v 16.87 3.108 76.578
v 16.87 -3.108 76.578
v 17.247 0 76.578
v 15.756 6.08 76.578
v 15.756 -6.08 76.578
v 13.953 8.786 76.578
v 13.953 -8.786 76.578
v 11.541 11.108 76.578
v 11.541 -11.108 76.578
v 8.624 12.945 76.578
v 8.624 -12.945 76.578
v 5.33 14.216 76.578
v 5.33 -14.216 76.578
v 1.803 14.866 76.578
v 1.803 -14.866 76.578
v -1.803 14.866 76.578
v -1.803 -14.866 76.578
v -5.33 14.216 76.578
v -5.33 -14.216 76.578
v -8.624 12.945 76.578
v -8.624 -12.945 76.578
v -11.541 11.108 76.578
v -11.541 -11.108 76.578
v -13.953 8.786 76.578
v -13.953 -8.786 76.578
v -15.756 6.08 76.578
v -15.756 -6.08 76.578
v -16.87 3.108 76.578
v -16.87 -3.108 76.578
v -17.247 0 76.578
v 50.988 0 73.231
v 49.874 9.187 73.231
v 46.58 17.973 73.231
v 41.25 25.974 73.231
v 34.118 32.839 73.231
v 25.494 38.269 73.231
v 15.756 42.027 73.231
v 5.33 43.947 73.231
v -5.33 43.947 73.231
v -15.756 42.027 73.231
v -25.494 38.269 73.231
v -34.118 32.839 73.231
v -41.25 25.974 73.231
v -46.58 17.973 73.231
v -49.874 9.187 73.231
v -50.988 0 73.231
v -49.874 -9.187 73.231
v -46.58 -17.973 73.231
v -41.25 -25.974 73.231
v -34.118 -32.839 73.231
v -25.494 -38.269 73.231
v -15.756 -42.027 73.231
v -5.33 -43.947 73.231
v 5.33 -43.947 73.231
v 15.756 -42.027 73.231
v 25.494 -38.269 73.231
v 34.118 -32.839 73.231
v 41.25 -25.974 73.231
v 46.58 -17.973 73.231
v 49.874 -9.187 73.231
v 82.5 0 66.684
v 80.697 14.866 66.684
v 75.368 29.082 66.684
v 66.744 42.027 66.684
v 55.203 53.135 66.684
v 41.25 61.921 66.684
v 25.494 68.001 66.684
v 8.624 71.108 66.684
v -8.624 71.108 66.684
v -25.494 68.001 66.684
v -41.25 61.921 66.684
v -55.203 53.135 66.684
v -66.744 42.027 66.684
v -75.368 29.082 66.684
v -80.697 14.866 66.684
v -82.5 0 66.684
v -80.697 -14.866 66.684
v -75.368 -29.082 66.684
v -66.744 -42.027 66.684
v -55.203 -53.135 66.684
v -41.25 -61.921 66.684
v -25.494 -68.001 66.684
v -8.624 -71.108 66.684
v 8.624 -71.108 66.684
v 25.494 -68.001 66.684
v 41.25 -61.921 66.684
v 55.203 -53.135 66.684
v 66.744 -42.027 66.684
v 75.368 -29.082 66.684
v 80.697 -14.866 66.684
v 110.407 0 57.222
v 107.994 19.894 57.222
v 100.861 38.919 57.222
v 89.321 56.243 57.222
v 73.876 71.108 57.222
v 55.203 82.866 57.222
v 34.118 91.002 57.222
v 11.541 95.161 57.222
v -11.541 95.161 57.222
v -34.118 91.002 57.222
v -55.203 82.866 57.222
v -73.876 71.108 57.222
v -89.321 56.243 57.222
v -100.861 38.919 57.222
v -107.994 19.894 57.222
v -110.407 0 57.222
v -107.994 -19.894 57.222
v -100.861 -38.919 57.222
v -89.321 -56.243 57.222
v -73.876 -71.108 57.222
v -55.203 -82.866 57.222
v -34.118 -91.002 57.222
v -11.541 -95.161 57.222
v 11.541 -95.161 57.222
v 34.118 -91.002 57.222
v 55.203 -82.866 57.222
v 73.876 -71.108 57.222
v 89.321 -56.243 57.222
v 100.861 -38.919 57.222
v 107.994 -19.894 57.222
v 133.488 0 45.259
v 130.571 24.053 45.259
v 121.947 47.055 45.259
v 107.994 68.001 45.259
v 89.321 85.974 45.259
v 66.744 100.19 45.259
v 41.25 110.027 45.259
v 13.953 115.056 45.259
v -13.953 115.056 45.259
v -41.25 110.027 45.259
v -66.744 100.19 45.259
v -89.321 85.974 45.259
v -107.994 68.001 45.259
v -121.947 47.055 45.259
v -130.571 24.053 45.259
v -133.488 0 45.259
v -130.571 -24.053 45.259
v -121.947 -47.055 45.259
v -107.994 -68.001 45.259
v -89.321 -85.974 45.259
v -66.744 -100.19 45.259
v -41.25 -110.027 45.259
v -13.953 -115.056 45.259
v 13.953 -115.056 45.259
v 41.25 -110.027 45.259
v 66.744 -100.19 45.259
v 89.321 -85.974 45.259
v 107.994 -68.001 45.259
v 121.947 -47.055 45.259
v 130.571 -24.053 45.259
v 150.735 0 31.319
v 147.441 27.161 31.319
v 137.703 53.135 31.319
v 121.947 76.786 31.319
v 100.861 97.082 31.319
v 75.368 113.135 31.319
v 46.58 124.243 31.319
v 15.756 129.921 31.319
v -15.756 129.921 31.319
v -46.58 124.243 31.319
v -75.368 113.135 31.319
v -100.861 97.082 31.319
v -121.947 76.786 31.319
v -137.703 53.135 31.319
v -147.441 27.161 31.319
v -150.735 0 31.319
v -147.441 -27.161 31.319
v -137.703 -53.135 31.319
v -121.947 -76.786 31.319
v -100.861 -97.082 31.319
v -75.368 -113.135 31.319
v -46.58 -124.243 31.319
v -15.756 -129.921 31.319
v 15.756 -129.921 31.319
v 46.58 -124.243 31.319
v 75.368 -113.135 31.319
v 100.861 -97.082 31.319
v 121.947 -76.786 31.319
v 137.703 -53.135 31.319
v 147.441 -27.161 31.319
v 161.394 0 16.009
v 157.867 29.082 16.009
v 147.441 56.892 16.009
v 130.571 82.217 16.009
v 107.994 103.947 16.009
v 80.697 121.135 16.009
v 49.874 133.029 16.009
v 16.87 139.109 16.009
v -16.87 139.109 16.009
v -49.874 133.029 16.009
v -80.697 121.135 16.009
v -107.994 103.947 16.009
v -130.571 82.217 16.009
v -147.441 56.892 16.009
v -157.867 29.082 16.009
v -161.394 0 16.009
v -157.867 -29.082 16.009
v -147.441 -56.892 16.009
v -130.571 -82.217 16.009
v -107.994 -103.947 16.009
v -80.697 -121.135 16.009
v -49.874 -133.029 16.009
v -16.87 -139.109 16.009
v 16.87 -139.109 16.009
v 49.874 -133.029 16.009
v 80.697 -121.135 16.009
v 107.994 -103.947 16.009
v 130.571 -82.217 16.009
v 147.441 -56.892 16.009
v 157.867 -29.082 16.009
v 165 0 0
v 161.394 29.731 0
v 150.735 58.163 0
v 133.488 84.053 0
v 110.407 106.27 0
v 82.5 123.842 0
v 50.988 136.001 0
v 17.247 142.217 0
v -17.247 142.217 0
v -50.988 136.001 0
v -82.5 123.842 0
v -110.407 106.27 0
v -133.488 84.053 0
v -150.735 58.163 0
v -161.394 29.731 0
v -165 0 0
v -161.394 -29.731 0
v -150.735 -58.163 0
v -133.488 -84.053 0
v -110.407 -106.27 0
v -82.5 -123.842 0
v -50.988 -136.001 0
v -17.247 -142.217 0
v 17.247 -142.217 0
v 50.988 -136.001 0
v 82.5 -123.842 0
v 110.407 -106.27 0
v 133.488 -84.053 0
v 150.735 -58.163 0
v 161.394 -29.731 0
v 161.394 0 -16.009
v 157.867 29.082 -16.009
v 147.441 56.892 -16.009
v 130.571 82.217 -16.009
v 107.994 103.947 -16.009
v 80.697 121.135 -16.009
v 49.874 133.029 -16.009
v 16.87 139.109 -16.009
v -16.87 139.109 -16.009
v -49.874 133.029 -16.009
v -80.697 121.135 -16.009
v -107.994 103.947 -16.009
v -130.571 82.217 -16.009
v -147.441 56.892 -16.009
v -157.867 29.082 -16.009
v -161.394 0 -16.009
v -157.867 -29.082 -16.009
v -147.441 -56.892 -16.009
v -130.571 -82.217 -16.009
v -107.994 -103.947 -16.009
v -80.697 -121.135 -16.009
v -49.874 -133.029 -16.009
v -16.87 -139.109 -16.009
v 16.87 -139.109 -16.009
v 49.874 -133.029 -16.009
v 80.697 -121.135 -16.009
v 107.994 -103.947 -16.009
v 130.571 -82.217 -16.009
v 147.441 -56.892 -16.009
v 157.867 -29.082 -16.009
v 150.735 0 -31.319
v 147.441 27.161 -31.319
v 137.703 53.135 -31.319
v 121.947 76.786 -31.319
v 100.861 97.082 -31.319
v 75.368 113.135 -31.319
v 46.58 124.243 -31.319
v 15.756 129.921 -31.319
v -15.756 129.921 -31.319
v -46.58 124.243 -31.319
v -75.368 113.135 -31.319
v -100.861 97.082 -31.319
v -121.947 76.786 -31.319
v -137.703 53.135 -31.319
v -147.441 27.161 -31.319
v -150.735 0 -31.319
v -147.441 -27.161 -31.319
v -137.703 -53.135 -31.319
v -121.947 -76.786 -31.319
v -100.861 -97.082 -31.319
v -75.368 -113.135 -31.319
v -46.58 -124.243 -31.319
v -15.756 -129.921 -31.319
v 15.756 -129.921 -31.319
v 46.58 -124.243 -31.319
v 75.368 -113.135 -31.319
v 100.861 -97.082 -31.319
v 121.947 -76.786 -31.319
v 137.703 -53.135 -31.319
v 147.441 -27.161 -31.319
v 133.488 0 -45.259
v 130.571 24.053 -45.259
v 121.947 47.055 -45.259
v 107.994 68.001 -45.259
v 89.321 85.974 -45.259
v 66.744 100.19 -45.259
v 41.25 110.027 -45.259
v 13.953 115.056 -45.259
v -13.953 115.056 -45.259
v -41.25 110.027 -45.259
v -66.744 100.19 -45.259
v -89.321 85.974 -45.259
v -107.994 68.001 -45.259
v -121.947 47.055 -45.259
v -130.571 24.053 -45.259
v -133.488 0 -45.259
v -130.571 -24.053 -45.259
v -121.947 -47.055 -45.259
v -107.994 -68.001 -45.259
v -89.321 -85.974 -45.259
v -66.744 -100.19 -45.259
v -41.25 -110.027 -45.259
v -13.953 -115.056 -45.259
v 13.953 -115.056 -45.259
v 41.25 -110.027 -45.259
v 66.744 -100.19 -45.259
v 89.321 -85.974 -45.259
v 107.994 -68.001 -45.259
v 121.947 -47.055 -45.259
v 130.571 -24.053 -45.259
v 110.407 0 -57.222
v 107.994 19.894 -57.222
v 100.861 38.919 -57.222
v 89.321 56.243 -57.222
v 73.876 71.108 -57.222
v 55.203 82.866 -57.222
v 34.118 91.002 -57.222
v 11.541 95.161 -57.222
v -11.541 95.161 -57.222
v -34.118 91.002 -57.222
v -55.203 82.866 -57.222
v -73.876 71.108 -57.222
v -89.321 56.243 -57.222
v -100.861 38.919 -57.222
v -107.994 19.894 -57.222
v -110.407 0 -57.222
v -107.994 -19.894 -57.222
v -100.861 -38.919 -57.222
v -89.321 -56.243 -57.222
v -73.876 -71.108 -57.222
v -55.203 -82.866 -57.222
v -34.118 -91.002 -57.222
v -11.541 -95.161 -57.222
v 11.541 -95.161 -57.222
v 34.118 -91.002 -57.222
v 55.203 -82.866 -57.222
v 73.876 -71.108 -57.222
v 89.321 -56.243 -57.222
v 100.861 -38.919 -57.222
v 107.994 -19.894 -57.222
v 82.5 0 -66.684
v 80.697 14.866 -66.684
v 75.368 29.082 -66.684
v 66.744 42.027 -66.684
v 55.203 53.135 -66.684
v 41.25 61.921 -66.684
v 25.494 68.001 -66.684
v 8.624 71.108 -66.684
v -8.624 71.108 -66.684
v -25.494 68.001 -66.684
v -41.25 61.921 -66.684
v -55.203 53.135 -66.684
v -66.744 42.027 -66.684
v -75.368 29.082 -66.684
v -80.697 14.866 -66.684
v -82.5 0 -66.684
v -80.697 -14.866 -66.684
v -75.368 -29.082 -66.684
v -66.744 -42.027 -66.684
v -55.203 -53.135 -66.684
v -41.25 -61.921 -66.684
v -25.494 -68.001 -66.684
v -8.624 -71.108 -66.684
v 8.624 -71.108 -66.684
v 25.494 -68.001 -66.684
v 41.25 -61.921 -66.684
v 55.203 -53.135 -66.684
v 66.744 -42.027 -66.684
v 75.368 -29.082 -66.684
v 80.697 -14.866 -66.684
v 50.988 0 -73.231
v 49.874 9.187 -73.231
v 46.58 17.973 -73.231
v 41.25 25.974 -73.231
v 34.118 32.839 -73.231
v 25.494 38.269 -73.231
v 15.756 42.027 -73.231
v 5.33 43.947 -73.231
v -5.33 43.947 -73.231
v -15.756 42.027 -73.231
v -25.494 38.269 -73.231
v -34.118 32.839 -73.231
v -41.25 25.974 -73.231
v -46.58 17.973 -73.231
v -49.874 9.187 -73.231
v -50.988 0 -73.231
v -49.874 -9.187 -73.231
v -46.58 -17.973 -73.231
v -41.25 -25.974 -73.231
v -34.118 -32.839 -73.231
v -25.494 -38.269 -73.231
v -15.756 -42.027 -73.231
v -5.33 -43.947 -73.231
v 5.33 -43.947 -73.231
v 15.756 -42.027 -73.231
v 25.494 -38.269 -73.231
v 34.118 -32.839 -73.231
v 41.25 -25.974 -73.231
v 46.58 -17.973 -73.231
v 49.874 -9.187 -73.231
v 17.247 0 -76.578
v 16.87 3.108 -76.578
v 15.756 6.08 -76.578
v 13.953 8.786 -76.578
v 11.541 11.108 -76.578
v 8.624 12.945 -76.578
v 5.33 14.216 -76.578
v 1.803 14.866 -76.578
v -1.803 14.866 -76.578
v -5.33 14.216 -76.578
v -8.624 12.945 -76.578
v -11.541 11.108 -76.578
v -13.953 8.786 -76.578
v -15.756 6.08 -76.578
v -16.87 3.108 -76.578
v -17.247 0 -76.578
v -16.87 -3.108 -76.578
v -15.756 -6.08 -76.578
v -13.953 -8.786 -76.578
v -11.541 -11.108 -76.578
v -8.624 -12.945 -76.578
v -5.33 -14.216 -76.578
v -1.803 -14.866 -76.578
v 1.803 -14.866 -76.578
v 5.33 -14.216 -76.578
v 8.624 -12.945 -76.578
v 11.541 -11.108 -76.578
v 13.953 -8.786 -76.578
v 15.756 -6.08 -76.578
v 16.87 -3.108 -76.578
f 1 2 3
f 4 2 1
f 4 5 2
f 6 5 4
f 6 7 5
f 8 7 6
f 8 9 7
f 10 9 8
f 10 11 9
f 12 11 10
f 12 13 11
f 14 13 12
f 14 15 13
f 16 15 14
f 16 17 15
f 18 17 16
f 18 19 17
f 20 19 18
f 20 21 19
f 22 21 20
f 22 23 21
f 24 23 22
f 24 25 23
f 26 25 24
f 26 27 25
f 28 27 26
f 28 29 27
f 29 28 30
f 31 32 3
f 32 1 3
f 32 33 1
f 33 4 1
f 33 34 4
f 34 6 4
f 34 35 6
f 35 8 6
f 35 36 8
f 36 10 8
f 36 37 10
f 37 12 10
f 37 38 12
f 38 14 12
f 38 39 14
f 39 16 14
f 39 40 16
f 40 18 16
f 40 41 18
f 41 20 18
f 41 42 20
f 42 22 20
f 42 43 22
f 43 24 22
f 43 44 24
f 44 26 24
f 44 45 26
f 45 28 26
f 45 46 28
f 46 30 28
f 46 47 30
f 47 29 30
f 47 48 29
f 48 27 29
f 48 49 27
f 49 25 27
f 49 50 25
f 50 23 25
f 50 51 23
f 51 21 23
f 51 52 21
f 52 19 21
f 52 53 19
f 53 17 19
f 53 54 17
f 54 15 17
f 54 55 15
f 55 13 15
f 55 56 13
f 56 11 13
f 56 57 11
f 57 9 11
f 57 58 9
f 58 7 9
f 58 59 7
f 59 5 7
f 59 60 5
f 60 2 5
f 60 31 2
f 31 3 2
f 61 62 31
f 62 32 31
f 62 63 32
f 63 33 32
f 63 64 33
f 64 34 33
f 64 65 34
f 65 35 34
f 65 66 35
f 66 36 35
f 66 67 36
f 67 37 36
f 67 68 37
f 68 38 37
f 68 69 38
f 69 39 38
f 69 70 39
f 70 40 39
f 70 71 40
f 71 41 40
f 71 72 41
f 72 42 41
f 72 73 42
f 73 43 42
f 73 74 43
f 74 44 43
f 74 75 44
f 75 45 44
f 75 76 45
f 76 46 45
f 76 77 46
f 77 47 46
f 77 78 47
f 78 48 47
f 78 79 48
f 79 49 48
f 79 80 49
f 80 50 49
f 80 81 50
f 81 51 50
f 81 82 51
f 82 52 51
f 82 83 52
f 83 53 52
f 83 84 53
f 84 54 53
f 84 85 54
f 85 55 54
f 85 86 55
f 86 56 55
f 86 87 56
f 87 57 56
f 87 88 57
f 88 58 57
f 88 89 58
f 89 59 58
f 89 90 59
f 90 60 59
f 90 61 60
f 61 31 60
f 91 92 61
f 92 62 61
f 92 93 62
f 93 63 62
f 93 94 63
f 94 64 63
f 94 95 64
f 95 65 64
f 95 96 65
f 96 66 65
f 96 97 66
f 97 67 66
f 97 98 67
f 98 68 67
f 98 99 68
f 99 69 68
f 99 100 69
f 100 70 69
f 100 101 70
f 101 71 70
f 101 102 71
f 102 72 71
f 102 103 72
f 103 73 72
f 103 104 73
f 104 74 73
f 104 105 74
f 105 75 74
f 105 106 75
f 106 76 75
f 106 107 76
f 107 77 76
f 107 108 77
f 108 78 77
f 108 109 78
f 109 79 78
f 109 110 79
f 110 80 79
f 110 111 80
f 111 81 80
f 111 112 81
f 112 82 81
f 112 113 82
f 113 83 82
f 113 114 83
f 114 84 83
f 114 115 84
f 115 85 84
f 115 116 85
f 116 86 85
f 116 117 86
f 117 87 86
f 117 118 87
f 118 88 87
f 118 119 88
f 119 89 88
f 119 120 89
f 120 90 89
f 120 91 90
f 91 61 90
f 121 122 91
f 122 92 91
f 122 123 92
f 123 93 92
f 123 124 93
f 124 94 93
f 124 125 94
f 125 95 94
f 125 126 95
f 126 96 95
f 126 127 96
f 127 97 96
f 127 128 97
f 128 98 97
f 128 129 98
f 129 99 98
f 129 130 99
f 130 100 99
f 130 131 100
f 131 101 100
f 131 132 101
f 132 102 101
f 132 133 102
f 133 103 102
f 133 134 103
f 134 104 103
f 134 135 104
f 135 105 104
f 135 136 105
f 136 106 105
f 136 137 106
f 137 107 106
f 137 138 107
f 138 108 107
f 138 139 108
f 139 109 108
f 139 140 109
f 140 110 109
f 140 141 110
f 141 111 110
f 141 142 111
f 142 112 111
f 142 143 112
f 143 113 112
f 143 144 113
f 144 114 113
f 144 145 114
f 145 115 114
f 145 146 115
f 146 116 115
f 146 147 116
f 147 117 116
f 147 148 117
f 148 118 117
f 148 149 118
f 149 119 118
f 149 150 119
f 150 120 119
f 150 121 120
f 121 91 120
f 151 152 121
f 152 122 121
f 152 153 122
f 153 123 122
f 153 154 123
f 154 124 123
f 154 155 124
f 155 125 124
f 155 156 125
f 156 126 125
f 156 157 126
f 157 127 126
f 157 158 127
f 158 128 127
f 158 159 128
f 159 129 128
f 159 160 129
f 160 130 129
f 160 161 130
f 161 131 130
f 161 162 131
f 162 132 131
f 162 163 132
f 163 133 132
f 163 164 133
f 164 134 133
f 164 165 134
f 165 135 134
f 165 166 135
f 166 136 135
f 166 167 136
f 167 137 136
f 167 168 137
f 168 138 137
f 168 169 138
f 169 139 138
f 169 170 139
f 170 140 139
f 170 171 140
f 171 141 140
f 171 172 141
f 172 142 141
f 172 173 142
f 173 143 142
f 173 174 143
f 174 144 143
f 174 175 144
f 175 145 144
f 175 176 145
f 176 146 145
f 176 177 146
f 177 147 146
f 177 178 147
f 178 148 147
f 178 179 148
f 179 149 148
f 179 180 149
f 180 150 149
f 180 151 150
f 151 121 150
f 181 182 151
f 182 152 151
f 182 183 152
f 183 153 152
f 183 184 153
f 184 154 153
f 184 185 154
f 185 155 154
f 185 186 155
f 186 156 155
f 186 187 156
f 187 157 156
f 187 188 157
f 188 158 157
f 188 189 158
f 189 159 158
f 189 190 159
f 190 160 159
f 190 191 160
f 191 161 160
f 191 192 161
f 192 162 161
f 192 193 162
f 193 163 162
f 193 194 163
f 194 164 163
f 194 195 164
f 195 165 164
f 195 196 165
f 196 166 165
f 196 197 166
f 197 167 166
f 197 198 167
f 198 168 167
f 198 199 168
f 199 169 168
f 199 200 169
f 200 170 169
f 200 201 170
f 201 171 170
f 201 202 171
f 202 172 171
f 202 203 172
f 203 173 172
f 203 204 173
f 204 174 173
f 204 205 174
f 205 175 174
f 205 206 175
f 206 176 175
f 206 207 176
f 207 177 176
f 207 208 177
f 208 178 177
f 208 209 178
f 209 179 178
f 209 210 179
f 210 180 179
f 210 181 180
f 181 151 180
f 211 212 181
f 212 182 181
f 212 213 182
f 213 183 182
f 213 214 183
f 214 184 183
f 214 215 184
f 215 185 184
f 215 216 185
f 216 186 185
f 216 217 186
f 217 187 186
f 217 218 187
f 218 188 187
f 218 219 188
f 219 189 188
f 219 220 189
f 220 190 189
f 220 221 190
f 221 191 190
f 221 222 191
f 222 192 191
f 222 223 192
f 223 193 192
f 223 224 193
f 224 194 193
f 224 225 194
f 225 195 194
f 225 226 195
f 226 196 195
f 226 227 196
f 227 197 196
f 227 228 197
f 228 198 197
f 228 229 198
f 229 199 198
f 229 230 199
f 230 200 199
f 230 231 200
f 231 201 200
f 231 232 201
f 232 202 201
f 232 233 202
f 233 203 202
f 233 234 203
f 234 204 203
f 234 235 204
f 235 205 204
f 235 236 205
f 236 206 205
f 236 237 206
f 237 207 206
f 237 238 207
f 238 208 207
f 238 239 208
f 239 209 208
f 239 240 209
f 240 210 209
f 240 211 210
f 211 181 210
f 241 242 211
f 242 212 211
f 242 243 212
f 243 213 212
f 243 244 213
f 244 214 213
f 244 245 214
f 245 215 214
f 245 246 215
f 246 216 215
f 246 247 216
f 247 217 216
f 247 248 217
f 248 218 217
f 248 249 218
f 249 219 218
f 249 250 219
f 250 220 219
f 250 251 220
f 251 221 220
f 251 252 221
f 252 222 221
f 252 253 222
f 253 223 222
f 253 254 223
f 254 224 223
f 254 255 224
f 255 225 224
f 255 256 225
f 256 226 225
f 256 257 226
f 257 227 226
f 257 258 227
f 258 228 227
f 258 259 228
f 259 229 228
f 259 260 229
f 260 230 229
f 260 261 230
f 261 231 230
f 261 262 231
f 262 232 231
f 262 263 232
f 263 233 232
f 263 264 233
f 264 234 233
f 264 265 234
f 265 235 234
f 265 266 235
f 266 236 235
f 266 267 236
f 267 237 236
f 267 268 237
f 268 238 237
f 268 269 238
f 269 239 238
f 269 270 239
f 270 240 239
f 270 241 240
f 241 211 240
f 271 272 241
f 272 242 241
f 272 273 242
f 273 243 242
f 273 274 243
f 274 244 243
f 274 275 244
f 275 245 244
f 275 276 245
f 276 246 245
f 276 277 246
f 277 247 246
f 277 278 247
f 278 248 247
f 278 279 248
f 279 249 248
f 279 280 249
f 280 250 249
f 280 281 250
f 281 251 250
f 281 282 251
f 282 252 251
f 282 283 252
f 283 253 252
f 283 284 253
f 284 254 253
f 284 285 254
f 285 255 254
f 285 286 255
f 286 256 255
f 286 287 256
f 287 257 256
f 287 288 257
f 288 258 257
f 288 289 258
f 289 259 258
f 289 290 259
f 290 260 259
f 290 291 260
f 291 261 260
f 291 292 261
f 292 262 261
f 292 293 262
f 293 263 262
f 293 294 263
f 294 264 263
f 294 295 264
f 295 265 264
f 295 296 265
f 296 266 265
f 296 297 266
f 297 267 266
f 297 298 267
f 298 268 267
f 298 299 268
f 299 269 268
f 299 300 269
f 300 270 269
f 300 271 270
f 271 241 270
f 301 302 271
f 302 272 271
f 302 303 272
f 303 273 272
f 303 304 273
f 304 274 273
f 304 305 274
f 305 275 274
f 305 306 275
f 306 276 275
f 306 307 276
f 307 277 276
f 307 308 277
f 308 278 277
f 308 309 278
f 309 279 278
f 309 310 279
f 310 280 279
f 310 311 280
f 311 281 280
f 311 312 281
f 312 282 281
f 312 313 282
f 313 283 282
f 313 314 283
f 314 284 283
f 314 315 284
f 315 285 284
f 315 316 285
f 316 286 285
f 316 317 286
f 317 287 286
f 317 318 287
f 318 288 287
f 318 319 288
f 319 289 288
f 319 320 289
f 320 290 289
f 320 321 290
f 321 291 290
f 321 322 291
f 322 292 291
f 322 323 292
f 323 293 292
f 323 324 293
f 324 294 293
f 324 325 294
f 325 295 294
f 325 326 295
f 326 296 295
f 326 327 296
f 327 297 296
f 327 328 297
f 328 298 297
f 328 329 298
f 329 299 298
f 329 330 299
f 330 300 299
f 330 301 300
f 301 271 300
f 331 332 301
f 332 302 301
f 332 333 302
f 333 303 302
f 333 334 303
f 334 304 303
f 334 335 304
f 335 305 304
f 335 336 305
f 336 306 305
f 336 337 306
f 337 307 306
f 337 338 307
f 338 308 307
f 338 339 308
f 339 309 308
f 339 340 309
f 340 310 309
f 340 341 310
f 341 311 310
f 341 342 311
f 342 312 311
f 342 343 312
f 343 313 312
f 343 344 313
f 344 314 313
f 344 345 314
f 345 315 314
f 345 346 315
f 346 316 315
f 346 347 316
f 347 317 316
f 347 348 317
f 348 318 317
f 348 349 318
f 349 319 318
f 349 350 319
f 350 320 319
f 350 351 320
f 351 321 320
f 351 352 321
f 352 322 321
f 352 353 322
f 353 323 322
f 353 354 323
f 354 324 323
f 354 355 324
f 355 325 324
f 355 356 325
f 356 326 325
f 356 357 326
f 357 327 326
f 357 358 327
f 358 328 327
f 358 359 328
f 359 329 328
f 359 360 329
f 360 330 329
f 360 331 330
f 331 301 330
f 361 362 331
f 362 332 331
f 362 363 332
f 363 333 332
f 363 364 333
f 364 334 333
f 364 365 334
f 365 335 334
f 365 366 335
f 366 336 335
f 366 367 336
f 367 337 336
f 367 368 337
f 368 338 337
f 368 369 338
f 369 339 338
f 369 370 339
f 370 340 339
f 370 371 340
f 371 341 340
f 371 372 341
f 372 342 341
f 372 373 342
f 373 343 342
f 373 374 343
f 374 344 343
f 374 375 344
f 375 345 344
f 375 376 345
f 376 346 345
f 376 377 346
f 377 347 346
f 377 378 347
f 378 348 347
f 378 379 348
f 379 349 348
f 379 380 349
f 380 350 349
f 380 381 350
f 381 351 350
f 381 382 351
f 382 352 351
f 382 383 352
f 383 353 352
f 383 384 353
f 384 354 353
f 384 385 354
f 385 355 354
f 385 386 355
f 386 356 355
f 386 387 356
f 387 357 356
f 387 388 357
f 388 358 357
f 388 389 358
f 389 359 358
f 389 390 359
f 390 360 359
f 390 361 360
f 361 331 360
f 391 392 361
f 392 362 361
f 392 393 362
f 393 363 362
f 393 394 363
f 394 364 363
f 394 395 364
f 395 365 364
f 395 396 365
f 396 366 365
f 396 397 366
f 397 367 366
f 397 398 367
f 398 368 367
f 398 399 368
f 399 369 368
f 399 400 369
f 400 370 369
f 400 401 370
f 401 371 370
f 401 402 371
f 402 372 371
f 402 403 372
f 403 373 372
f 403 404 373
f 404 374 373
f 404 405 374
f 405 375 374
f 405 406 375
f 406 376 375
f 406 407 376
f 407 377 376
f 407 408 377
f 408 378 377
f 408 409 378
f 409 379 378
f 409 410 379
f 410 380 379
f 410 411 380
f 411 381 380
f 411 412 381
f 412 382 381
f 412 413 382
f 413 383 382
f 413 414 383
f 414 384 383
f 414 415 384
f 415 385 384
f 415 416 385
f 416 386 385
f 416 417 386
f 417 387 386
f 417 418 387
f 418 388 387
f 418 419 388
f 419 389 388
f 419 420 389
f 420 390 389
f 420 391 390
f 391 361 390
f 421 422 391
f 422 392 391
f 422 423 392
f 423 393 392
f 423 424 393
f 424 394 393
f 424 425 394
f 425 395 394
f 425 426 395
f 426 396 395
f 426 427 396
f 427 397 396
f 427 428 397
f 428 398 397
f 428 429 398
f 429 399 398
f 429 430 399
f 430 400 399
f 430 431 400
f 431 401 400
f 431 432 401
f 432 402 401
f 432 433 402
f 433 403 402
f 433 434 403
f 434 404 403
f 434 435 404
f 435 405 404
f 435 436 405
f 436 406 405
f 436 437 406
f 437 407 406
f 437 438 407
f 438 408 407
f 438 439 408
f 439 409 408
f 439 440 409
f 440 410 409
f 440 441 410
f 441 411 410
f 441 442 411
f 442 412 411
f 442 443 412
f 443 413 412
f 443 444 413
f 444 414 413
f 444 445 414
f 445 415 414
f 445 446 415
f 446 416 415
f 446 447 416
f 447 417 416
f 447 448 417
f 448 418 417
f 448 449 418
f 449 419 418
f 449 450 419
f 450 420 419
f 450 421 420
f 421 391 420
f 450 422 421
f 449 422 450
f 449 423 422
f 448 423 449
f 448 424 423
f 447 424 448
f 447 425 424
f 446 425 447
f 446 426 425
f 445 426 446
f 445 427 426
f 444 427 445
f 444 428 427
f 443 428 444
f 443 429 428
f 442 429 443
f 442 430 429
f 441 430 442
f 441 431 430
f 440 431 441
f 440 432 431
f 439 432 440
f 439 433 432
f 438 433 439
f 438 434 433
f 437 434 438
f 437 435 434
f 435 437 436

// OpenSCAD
// Generated by SolidPython 1.0.1 on 2020-07-29 00:46:52


scale(v = [15, 13, 7]) {
	sphere(r = 11);
}
/***********************************************
*********      SolidPython code:      **********
************************************************
 
# import packages: SolidPython
from solid import *
from solid.utils import *
from itertools import chain, combinations, permutations


class Resize:

    def __init__(self, scad_file):
        self.scad_file = scad_file
        #self.scad_file = import_scad(scad_file)
        # cone/cylinder param:
        self.r1 = 0
        self.r2 = 0
        self.h = 0
        # rectangular prism param:
        self.w = 0
        self.l = 0
        # ellipse param:
        self.r = 0

    # import OpenScad code (file name corresponds to shape)


    # classify shape + parameters
    def assign(self, param1, param2, param3):
        if self.scad_file == 'cone.scad':
            self.r1 = param1
            self.r2 = param2
            self.h = param3
        elif self.scad_file == 'cylinder.scad':
            self.r1 = param1
            self.r2 = param2
            self.h = param3
        elif self.scad_file == 'rectangularPrism.scad':
            self.h = param1
            self.l = param2
            self.w = param3
        else:
            self.r = param1
            self.h = param2

    # resize parameters
    def iterate(self):
        x = range(3, 20, 2)
        i = 1
        if self.scad_file == 'cone.scad':
            tempList = list(permutations(x, 2))
            for temp in tempList:
                param1 = temp[0]
                param2 = temp[1]
                filepath = 'produced_scad_files/' + 'cone' + str(param1) + '_' + str(param2) + '_' + '.scad'
                scad_render_to_file(cylinder(h=param1, r1=param2, r2=0), filepath)

        elif self.scad_file == 'cylinder.scad':
            tempList = list(permutations(x, 3))
            for temp in tempList:
                param1 = temp[0]
                param2 = temp[1]
                filepath = 'produced_scad_files/' + 'cylinder' + str(param1) + '_' + str(param2) + '_' + '.scad'
                scad_render_to_file(cylinder(h=param1, r1=param2, r2=param2), filepath)

        elif self.scad_file == 'rectangularPrism.scad':
            tempList = list(permutations(x, 3))
            for temp in tempList:
                param1 = temp[0]
                param2 = temp[1]
                param3 = temp[2]
                filepath = 'produced_scad_files/' + 'rectangularPrism' + str(param1) + '_' + str(param2) + '_' + str(
                    param3) + '.scad'
                scad_render_to_file(cube(size=(param1, param2, param3)), filepath)

        elif self.scad_file == 'ellipse.scad':
            tempList = list(permutations(x, 4))
            for temp in tempList:
                param1 = temp[0]
                param2 = temp[1]
                param3 = temp[2]
                param4 = temp[3]
                filepath = 'produced_scad_files/' + 'ellipse' + str(param1) + '_' + str(param2) + '_' + str(param3) + '_' + str(param4) + '.scad'
                scad_render_to_file(scale([param1, param2, param3])(sphere(r=param4)), filepath)

    def render_to_scadfile(self):
        scad_render_to_file(scad, 'example.scad') 
 
************************************************/
